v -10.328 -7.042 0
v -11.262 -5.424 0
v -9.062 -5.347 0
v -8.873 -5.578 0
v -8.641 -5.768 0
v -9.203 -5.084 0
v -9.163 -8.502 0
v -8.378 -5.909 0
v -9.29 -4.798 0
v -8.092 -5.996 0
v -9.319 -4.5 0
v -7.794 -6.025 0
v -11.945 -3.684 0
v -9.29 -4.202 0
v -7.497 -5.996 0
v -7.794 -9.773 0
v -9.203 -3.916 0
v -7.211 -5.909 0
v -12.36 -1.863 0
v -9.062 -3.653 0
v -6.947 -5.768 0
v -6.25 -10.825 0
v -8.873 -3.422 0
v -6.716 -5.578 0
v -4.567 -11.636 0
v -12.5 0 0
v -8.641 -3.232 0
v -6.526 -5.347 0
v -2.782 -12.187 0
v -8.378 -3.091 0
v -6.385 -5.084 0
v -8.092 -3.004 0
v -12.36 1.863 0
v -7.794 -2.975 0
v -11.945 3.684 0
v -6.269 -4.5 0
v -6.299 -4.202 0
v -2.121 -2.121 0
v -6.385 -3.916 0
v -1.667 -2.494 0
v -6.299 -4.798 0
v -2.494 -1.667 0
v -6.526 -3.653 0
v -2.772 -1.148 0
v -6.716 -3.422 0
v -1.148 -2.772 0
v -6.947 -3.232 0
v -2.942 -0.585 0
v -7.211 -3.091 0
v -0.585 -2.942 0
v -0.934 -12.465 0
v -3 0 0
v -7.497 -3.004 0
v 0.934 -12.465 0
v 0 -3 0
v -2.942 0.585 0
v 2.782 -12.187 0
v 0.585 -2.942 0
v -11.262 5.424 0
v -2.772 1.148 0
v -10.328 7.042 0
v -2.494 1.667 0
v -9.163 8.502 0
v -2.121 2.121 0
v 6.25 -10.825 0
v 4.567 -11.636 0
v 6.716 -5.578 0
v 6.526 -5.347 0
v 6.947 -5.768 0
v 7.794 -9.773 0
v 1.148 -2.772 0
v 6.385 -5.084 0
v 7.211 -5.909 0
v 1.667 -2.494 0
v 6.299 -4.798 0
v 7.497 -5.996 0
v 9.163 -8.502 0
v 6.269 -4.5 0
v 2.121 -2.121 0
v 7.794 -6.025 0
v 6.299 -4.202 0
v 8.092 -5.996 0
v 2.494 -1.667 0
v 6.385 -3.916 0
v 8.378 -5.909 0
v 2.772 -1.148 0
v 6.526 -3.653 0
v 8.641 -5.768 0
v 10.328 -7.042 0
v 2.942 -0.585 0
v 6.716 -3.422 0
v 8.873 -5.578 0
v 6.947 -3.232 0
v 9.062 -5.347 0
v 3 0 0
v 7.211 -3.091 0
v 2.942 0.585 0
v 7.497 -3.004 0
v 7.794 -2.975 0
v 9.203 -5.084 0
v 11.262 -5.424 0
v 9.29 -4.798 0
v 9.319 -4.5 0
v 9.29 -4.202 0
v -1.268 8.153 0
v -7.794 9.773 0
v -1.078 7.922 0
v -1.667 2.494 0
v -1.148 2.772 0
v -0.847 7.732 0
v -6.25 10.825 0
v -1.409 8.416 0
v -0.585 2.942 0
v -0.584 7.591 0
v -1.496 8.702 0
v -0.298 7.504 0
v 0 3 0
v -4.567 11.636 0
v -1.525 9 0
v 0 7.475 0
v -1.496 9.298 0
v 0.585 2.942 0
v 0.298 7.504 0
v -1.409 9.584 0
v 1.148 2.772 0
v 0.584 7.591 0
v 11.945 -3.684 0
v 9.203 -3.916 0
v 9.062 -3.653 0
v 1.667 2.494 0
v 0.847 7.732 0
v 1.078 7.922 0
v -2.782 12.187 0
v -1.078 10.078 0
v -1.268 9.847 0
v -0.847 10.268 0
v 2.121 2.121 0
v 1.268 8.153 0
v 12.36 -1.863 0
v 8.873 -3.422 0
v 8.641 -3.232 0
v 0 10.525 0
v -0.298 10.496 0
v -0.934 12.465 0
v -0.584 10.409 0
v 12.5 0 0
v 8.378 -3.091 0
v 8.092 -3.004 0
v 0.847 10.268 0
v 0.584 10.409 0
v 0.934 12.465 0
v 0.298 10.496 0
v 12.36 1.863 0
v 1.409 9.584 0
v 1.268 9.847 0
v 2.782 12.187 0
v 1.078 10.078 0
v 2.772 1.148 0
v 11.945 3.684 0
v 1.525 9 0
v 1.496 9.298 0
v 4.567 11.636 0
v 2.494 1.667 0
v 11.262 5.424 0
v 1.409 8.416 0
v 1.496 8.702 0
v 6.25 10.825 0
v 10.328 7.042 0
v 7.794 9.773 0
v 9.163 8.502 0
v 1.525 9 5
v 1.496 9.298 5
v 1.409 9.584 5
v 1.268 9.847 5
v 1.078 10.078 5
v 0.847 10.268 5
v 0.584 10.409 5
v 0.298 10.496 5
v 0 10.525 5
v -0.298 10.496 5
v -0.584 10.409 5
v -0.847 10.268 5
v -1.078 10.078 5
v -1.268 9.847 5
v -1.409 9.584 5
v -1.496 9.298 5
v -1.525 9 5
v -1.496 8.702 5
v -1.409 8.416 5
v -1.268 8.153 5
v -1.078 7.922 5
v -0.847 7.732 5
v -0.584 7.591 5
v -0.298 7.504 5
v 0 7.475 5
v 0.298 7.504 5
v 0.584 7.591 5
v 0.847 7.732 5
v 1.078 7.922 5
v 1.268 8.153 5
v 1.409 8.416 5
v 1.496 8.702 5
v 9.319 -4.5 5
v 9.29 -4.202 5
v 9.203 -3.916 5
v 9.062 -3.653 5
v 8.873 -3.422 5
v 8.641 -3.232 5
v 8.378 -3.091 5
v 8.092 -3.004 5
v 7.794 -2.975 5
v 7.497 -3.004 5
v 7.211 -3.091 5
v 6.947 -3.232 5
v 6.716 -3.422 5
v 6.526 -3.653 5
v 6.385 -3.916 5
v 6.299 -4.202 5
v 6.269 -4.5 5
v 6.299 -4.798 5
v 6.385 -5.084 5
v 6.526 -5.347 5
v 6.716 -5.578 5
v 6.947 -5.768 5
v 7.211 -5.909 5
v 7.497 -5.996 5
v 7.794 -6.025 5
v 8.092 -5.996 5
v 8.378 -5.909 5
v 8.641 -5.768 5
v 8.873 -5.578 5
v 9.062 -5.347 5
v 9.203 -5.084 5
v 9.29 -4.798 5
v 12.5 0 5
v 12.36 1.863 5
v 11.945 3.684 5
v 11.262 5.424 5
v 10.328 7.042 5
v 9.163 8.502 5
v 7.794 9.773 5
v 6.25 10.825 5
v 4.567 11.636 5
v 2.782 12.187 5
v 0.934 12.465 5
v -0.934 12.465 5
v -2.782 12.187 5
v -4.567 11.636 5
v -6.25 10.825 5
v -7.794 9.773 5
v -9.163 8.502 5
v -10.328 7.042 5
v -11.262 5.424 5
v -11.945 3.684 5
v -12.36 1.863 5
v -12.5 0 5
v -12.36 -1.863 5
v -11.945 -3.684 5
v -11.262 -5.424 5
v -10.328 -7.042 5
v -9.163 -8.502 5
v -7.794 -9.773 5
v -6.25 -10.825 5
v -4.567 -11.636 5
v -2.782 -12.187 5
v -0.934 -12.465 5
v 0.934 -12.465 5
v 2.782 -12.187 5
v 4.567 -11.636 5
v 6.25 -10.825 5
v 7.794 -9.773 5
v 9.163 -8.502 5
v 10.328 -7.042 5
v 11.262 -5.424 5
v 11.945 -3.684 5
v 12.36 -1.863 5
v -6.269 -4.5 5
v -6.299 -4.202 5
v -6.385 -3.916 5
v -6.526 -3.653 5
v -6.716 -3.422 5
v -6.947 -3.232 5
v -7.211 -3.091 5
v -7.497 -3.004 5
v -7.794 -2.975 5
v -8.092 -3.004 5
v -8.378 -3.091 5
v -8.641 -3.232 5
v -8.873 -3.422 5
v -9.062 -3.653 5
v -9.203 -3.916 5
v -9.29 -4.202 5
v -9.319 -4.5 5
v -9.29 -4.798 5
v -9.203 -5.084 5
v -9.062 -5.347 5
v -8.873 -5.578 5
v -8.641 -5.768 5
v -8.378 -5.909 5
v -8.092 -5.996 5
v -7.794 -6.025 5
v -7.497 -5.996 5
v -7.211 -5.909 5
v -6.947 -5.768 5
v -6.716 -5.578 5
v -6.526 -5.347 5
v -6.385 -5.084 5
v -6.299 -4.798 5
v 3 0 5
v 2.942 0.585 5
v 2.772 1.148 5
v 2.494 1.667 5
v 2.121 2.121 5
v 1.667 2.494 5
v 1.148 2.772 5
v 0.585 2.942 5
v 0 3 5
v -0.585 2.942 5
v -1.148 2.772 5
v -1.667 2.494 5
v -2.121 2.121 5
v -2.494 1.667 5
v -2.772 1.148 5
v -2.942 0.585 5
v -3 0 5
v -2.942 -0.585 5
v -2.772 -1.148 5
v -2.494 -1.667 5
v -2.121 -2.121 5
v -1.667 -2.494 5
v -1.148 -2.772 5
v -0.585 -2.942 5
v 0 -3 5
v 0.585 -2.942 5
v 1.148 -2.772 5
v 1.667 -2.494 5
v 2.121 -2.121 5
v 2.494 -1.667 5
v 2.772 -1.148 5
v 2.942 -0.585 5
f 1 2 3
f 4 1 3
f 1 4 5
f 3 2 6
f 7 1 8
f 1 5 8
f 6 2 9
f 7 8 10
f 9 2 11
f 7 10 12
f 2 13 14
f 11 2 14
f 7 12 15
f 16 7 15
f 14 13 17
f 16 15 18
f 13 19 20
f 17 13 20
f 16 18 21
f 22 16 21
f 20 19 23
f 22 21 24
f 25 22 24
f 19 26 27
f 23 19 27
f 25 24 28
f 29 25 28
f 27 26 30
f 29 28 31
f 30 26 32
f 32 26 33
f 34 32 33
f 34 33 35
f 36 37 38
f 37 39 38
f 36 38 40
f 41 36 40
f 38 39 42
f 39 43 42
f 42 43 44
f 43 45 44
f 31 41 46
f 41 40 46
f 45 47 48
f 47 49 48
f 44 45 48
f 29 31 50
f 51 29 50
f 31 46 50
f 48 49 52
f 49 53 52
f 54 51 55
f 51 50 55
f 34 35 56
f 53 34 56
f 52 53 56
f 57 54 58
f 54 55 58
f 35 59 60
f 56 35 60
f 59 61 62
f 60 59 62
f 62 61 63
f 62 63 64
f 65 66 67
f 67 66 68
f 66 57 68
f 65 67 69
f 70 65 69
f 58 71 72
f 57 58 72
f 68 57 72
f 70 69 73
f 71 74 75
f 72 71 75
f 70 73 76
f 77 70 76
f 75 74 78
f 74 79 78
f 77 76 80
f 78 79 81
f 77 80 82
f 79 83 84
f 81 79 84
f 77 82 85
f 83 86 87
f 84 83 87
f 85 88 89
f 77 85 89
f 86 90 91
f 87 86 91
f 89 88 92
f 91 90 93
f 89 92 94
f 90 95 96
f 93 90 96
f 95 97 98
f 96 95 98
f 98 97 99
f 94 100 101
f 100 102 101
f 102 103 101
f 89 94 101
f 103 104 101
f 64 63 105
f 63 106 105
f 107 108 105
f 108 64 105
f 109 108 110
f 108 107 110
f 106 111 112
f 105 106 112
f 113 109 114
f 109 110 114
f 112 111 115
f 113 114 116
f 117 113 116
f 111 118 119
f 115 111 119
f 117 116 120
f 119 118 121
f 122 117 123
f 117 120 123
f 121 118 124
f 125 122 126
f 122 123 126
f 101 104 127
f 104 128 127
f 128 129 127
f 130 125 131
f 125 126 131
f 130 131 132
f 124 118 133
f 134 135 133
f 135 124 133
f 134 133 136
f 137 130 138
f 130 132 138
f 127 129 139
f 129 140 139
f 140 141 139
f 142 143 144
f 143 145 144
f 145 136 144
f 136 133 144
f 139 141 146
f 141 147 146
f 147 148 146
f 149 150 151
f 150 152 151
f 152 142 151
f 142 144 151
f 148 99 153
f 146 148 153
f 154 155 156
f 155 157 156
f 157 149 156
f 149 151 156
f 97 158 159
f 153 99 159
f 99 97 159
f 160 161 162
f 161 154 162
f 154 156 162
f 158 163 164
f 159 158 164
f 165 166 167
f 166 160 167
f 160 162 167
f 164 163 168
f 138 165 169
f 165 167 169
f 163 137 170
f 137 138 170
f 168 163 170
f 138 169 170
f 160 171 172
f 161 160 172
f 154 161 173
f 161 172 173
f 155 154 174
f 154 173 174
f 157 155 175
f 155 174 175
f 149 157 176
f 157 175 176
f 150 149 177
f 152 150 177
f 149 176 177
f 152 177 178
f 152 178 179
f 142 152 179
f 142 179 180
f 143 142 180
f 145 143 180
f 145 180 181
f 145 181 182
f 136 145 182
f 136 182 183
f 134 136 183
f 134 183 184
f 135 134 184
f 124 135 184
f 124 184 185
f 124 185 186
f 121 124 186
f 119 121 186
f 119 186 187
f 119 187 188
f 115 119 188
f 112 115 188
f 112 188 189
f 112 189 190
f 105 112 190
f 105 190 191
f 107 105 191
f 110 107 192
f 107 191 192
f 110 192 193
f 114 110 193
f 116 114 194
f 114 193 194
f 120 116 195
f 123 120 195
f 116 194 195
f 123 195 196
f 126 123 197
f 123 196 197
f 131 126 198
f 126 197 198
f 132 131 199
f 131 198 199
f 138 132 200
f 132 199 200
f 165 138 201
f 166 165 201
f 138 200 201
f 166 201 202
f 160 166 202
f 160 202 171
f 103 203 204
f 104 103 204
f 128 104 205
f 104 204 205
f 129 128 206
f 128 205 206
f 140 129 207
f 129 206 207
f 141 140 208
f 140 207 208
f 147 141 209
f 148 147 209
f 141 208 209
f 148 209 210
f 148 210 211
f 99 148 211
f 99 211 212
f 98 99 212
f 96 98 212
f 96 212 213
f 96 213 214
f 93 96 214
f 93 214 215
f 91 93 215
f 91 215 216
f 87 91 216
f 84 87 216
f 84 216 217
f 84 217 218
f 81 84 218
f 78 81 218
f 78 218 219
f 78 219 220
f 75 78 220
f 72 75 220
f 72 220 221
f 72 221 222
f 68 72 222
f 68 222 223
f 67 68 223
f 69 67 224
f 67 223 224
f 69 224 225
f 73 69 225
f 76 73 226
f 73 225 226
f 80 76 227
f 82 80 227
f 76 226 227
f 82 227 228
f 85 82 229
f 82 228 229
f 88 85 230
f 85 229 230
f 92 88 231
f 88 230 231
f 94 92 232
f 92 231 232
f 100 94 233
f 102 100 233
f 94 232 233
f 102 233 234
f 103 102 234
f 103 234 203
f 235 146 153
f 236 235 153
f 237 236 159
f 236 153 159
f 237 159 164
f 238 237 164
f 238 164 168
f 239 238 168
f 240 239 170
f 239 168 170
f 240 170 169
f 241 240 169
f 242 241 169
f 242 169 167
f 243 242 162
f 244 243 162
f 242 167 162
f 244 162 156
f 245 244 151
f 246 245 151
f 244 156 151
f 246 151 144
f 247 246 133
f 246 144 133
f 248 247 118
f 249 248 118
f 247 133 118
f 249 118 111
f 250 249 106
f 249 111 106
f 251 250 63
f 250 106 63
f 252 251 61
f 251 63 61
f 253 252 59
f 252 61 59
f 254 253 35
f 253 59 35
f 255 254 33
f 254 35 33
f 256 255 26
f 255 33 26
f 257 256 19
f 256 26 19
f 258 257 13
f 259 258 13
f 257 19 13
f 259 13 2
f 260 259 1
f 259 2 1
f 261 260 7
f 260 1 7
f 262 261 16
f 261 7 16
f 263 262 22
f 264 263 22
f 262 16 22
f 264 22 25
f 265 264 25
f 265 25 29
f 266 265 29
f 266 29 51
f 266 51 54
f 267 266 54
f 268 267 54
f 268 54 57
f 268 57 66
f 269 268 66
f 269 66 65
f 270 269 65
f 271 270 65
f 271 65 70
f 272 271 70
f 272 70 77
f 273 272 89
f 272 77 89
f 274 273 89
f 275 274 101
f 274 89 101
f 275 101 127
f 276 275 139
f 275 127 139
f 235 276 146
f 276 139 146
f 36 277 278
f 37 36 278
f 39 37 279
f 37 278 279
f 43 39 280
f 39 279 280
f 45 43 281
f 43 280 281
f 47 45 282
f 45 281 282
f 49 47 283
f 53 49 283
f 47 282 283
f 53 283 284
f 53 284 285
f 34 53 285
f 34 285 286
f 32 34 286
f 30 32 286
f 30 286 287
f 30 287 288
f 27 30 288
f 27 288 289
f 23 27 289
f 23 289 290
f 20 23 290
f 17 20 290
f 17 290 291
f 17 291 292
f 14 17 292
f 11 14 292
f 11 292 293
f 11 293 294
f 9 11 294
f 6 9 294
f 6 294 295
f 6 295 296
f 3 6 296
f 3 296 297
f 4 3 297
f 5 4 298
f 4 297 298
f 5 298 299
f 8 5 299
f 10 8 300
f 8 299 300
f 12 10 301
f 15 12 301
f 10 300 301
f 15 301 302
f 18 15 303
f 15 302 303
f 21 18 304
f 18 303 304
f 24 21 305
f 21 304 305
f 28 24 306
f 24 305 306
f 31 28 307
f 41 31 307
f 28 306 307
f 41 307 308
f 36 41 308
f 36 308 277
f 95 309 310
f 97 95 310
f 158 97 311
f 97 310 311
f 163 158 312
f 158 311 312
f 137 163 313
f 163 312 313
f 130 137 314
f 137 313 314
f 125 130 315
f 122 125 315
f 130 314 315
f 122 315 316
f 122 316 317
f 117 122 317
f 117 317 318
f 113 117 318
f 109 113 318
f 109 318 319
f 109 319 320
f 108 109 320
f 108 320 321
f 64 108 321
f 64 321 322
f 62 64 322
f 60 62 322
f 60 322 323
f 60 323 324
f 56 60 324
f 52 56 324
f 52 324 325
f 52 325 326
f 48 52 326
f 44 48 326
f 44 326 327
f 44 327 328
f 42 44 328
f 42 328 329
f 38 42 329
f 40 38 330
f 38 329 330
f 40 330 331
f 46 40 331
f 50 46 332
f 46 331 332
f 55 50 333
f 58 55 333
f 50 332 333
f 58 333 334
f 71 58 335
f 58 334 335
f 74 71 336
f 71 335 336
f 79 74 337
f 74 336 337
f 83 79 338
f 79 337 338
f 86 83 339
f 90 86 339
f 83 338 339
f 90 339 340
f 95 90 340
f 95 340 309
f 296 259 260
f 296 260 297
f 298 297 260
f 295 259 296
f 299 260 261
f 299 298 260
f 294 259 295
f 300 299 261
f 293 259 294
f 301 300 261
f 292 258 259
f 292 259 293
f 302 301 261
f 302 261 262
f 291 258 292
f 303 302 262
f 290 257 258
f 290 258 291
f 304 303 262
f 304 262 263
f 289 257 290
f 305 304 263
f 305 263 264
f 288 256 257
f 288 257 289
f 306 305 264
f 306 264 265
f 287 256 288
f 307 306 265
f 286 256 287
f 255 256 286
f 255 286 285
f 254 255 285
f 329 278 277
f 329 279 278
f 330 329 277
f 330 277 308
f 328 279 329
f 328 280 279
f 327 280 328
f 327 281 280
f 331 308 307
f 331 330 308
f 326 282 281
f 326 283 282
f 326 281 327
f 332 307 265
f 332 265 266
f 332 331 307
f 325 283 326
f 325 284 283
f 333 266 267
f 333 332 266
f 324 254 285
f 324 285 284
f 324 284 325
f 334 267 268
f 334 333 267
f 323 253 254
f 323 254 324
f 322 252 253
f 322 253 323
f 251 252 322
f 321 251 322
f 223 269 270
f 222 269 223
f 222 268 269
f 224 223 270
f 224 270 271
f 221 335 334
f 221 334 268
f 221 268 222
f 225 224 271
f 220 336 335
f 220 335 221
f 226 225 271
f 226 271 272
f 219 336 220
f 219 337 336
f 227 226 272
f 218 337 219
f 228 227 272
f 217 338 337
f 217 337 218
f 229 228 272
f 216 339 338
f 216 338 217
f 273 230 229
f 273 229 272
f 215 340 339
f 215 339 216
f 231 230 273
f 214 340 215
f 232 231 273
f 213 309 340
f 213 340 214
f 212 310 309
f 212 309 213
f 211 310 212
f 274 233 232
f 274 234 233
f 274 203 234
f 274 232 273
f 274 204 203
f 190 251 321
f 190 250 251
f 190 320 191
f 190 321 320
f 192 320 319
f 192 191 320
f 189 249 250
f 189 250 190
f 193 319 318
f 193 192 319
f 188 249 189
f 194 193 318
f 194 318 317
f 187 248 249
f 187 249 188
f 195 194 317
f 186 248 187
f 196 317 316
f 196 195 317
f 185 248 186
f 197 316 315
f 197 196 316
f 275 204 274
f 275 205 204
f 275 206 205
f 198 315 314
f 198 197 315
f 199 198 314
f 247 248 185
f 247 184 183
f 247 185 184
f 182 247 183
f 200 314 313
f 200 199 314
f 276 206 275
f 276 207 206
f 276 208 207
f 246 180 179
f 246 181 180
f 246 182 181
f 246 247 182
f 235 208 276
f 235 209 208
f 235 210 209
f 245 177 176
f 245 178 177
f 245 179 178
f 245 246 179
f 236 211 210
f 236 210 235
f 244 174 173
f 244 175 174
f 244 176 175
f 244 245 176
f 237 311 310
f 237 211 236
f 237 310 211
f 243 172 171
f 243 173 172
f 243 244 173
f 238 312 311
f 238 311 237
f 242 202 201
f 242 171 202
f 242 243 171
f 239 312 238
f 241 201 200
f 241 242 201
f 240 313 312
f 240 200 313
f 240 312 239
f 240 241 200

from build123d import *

# Parameters (mm, degrees)
SKETCH1_R           = 12.5
BOSS_EXTRUDE1_DEPTH = 5
CUT_EXTRUDE2_REACH  = 20.371
SKETCH3_R           = 3
CUT_EXTRUDE3_REACH  = 20.371
SKETCH4_R           = 1.525


with BuildPart() as part:
    # Sketch1 → Boss-Extrude1 (new body)
    with BuildSketch(Plane.XY):
        Circle(SKETCH1_R)
    extrude(amount=BOSS_EXTRUDE1_DEPTH)

    # Sketch3 → Cut-Extrude2 (cut, up to next)
    with BuildSketch(Plane.XY.offset(5), mode=Mode.PRIVATE) as cut_extrude2_sk1:
        Circle(SKETCH3_R)
    cut_extrude2_tool1 = extrude(cut_extrude2_sk1.sketch, amount=-CUT_EXTRUDE2_REACH, mode=Mode.PRIVATE) & part.part
    add(cut_extrude2_tool1.solids().sort_by_distance((0, 0, 5))[0], mode=Mode.SUBTRACT)

    # Sketch4 → Cut-Extrude3 (cut, up to next)
    with BuildSketch(Plane.XY.offset(5), mode=Mode.PRIVATE) as cut_extrude3_sk1:
        with Locations((0, 9)):
            Circle(SKETCH4_R)
    cut_extrude3_tool1 = extrude(cut_extrude3_sk1.sketch, amount=-CUT_EXTRUDE3_REACH, mode=Mode.PRIVATE) & part.part
    # Sketch4 → Cut-Extrude3 (cut, up to next)
    with BuildSketch(Plane.XY.offset(5), mode=Mode.PRIVATE) as cut_extrude3_sk2:
        with Locations((7.794228634, -4.5)):
            Circle(SKETCH4_R)
    cut_extrude3_tool2 = extrude(cut_extrude3_sk2.sketch, amount=-CUT_EXTRUDE3_REACH, mode=Mode.PRIVATE) & part.part
    # Sketch4 → Cut-Extrude3 (cut, up to next)
    with BuildSketch(Plane.XY.offset(5), mode=Mode.PRIVATE) as cut_extrude3_sk3:
        with Locations((-7.794228634, -4.5)):
            Circle(SKETCH4_R)
    cut_extrude3_tool3 = extrude(cut_extrude3_sk3.sketch, amount=-CUT_EXTRUDE3_REACH, mode=Mode.PRIVATE) & part.part
    add(cut_extrude3_tool1.solids().sort_by_distance((0, 9, 5))[0], mode=Mode.SUBTRACT)
    add(cut_extrude3_tool2.solids().sort_by_distance((7.794229, -4.5, 5))[0], mode=Mode.SUBTRACT)
    add(cut_extrude3_tool3.solids().sort_by_distance((-7.794229, -4.5, 5))[0], mode=Mode.SUBTRACT)


solid = part.part
